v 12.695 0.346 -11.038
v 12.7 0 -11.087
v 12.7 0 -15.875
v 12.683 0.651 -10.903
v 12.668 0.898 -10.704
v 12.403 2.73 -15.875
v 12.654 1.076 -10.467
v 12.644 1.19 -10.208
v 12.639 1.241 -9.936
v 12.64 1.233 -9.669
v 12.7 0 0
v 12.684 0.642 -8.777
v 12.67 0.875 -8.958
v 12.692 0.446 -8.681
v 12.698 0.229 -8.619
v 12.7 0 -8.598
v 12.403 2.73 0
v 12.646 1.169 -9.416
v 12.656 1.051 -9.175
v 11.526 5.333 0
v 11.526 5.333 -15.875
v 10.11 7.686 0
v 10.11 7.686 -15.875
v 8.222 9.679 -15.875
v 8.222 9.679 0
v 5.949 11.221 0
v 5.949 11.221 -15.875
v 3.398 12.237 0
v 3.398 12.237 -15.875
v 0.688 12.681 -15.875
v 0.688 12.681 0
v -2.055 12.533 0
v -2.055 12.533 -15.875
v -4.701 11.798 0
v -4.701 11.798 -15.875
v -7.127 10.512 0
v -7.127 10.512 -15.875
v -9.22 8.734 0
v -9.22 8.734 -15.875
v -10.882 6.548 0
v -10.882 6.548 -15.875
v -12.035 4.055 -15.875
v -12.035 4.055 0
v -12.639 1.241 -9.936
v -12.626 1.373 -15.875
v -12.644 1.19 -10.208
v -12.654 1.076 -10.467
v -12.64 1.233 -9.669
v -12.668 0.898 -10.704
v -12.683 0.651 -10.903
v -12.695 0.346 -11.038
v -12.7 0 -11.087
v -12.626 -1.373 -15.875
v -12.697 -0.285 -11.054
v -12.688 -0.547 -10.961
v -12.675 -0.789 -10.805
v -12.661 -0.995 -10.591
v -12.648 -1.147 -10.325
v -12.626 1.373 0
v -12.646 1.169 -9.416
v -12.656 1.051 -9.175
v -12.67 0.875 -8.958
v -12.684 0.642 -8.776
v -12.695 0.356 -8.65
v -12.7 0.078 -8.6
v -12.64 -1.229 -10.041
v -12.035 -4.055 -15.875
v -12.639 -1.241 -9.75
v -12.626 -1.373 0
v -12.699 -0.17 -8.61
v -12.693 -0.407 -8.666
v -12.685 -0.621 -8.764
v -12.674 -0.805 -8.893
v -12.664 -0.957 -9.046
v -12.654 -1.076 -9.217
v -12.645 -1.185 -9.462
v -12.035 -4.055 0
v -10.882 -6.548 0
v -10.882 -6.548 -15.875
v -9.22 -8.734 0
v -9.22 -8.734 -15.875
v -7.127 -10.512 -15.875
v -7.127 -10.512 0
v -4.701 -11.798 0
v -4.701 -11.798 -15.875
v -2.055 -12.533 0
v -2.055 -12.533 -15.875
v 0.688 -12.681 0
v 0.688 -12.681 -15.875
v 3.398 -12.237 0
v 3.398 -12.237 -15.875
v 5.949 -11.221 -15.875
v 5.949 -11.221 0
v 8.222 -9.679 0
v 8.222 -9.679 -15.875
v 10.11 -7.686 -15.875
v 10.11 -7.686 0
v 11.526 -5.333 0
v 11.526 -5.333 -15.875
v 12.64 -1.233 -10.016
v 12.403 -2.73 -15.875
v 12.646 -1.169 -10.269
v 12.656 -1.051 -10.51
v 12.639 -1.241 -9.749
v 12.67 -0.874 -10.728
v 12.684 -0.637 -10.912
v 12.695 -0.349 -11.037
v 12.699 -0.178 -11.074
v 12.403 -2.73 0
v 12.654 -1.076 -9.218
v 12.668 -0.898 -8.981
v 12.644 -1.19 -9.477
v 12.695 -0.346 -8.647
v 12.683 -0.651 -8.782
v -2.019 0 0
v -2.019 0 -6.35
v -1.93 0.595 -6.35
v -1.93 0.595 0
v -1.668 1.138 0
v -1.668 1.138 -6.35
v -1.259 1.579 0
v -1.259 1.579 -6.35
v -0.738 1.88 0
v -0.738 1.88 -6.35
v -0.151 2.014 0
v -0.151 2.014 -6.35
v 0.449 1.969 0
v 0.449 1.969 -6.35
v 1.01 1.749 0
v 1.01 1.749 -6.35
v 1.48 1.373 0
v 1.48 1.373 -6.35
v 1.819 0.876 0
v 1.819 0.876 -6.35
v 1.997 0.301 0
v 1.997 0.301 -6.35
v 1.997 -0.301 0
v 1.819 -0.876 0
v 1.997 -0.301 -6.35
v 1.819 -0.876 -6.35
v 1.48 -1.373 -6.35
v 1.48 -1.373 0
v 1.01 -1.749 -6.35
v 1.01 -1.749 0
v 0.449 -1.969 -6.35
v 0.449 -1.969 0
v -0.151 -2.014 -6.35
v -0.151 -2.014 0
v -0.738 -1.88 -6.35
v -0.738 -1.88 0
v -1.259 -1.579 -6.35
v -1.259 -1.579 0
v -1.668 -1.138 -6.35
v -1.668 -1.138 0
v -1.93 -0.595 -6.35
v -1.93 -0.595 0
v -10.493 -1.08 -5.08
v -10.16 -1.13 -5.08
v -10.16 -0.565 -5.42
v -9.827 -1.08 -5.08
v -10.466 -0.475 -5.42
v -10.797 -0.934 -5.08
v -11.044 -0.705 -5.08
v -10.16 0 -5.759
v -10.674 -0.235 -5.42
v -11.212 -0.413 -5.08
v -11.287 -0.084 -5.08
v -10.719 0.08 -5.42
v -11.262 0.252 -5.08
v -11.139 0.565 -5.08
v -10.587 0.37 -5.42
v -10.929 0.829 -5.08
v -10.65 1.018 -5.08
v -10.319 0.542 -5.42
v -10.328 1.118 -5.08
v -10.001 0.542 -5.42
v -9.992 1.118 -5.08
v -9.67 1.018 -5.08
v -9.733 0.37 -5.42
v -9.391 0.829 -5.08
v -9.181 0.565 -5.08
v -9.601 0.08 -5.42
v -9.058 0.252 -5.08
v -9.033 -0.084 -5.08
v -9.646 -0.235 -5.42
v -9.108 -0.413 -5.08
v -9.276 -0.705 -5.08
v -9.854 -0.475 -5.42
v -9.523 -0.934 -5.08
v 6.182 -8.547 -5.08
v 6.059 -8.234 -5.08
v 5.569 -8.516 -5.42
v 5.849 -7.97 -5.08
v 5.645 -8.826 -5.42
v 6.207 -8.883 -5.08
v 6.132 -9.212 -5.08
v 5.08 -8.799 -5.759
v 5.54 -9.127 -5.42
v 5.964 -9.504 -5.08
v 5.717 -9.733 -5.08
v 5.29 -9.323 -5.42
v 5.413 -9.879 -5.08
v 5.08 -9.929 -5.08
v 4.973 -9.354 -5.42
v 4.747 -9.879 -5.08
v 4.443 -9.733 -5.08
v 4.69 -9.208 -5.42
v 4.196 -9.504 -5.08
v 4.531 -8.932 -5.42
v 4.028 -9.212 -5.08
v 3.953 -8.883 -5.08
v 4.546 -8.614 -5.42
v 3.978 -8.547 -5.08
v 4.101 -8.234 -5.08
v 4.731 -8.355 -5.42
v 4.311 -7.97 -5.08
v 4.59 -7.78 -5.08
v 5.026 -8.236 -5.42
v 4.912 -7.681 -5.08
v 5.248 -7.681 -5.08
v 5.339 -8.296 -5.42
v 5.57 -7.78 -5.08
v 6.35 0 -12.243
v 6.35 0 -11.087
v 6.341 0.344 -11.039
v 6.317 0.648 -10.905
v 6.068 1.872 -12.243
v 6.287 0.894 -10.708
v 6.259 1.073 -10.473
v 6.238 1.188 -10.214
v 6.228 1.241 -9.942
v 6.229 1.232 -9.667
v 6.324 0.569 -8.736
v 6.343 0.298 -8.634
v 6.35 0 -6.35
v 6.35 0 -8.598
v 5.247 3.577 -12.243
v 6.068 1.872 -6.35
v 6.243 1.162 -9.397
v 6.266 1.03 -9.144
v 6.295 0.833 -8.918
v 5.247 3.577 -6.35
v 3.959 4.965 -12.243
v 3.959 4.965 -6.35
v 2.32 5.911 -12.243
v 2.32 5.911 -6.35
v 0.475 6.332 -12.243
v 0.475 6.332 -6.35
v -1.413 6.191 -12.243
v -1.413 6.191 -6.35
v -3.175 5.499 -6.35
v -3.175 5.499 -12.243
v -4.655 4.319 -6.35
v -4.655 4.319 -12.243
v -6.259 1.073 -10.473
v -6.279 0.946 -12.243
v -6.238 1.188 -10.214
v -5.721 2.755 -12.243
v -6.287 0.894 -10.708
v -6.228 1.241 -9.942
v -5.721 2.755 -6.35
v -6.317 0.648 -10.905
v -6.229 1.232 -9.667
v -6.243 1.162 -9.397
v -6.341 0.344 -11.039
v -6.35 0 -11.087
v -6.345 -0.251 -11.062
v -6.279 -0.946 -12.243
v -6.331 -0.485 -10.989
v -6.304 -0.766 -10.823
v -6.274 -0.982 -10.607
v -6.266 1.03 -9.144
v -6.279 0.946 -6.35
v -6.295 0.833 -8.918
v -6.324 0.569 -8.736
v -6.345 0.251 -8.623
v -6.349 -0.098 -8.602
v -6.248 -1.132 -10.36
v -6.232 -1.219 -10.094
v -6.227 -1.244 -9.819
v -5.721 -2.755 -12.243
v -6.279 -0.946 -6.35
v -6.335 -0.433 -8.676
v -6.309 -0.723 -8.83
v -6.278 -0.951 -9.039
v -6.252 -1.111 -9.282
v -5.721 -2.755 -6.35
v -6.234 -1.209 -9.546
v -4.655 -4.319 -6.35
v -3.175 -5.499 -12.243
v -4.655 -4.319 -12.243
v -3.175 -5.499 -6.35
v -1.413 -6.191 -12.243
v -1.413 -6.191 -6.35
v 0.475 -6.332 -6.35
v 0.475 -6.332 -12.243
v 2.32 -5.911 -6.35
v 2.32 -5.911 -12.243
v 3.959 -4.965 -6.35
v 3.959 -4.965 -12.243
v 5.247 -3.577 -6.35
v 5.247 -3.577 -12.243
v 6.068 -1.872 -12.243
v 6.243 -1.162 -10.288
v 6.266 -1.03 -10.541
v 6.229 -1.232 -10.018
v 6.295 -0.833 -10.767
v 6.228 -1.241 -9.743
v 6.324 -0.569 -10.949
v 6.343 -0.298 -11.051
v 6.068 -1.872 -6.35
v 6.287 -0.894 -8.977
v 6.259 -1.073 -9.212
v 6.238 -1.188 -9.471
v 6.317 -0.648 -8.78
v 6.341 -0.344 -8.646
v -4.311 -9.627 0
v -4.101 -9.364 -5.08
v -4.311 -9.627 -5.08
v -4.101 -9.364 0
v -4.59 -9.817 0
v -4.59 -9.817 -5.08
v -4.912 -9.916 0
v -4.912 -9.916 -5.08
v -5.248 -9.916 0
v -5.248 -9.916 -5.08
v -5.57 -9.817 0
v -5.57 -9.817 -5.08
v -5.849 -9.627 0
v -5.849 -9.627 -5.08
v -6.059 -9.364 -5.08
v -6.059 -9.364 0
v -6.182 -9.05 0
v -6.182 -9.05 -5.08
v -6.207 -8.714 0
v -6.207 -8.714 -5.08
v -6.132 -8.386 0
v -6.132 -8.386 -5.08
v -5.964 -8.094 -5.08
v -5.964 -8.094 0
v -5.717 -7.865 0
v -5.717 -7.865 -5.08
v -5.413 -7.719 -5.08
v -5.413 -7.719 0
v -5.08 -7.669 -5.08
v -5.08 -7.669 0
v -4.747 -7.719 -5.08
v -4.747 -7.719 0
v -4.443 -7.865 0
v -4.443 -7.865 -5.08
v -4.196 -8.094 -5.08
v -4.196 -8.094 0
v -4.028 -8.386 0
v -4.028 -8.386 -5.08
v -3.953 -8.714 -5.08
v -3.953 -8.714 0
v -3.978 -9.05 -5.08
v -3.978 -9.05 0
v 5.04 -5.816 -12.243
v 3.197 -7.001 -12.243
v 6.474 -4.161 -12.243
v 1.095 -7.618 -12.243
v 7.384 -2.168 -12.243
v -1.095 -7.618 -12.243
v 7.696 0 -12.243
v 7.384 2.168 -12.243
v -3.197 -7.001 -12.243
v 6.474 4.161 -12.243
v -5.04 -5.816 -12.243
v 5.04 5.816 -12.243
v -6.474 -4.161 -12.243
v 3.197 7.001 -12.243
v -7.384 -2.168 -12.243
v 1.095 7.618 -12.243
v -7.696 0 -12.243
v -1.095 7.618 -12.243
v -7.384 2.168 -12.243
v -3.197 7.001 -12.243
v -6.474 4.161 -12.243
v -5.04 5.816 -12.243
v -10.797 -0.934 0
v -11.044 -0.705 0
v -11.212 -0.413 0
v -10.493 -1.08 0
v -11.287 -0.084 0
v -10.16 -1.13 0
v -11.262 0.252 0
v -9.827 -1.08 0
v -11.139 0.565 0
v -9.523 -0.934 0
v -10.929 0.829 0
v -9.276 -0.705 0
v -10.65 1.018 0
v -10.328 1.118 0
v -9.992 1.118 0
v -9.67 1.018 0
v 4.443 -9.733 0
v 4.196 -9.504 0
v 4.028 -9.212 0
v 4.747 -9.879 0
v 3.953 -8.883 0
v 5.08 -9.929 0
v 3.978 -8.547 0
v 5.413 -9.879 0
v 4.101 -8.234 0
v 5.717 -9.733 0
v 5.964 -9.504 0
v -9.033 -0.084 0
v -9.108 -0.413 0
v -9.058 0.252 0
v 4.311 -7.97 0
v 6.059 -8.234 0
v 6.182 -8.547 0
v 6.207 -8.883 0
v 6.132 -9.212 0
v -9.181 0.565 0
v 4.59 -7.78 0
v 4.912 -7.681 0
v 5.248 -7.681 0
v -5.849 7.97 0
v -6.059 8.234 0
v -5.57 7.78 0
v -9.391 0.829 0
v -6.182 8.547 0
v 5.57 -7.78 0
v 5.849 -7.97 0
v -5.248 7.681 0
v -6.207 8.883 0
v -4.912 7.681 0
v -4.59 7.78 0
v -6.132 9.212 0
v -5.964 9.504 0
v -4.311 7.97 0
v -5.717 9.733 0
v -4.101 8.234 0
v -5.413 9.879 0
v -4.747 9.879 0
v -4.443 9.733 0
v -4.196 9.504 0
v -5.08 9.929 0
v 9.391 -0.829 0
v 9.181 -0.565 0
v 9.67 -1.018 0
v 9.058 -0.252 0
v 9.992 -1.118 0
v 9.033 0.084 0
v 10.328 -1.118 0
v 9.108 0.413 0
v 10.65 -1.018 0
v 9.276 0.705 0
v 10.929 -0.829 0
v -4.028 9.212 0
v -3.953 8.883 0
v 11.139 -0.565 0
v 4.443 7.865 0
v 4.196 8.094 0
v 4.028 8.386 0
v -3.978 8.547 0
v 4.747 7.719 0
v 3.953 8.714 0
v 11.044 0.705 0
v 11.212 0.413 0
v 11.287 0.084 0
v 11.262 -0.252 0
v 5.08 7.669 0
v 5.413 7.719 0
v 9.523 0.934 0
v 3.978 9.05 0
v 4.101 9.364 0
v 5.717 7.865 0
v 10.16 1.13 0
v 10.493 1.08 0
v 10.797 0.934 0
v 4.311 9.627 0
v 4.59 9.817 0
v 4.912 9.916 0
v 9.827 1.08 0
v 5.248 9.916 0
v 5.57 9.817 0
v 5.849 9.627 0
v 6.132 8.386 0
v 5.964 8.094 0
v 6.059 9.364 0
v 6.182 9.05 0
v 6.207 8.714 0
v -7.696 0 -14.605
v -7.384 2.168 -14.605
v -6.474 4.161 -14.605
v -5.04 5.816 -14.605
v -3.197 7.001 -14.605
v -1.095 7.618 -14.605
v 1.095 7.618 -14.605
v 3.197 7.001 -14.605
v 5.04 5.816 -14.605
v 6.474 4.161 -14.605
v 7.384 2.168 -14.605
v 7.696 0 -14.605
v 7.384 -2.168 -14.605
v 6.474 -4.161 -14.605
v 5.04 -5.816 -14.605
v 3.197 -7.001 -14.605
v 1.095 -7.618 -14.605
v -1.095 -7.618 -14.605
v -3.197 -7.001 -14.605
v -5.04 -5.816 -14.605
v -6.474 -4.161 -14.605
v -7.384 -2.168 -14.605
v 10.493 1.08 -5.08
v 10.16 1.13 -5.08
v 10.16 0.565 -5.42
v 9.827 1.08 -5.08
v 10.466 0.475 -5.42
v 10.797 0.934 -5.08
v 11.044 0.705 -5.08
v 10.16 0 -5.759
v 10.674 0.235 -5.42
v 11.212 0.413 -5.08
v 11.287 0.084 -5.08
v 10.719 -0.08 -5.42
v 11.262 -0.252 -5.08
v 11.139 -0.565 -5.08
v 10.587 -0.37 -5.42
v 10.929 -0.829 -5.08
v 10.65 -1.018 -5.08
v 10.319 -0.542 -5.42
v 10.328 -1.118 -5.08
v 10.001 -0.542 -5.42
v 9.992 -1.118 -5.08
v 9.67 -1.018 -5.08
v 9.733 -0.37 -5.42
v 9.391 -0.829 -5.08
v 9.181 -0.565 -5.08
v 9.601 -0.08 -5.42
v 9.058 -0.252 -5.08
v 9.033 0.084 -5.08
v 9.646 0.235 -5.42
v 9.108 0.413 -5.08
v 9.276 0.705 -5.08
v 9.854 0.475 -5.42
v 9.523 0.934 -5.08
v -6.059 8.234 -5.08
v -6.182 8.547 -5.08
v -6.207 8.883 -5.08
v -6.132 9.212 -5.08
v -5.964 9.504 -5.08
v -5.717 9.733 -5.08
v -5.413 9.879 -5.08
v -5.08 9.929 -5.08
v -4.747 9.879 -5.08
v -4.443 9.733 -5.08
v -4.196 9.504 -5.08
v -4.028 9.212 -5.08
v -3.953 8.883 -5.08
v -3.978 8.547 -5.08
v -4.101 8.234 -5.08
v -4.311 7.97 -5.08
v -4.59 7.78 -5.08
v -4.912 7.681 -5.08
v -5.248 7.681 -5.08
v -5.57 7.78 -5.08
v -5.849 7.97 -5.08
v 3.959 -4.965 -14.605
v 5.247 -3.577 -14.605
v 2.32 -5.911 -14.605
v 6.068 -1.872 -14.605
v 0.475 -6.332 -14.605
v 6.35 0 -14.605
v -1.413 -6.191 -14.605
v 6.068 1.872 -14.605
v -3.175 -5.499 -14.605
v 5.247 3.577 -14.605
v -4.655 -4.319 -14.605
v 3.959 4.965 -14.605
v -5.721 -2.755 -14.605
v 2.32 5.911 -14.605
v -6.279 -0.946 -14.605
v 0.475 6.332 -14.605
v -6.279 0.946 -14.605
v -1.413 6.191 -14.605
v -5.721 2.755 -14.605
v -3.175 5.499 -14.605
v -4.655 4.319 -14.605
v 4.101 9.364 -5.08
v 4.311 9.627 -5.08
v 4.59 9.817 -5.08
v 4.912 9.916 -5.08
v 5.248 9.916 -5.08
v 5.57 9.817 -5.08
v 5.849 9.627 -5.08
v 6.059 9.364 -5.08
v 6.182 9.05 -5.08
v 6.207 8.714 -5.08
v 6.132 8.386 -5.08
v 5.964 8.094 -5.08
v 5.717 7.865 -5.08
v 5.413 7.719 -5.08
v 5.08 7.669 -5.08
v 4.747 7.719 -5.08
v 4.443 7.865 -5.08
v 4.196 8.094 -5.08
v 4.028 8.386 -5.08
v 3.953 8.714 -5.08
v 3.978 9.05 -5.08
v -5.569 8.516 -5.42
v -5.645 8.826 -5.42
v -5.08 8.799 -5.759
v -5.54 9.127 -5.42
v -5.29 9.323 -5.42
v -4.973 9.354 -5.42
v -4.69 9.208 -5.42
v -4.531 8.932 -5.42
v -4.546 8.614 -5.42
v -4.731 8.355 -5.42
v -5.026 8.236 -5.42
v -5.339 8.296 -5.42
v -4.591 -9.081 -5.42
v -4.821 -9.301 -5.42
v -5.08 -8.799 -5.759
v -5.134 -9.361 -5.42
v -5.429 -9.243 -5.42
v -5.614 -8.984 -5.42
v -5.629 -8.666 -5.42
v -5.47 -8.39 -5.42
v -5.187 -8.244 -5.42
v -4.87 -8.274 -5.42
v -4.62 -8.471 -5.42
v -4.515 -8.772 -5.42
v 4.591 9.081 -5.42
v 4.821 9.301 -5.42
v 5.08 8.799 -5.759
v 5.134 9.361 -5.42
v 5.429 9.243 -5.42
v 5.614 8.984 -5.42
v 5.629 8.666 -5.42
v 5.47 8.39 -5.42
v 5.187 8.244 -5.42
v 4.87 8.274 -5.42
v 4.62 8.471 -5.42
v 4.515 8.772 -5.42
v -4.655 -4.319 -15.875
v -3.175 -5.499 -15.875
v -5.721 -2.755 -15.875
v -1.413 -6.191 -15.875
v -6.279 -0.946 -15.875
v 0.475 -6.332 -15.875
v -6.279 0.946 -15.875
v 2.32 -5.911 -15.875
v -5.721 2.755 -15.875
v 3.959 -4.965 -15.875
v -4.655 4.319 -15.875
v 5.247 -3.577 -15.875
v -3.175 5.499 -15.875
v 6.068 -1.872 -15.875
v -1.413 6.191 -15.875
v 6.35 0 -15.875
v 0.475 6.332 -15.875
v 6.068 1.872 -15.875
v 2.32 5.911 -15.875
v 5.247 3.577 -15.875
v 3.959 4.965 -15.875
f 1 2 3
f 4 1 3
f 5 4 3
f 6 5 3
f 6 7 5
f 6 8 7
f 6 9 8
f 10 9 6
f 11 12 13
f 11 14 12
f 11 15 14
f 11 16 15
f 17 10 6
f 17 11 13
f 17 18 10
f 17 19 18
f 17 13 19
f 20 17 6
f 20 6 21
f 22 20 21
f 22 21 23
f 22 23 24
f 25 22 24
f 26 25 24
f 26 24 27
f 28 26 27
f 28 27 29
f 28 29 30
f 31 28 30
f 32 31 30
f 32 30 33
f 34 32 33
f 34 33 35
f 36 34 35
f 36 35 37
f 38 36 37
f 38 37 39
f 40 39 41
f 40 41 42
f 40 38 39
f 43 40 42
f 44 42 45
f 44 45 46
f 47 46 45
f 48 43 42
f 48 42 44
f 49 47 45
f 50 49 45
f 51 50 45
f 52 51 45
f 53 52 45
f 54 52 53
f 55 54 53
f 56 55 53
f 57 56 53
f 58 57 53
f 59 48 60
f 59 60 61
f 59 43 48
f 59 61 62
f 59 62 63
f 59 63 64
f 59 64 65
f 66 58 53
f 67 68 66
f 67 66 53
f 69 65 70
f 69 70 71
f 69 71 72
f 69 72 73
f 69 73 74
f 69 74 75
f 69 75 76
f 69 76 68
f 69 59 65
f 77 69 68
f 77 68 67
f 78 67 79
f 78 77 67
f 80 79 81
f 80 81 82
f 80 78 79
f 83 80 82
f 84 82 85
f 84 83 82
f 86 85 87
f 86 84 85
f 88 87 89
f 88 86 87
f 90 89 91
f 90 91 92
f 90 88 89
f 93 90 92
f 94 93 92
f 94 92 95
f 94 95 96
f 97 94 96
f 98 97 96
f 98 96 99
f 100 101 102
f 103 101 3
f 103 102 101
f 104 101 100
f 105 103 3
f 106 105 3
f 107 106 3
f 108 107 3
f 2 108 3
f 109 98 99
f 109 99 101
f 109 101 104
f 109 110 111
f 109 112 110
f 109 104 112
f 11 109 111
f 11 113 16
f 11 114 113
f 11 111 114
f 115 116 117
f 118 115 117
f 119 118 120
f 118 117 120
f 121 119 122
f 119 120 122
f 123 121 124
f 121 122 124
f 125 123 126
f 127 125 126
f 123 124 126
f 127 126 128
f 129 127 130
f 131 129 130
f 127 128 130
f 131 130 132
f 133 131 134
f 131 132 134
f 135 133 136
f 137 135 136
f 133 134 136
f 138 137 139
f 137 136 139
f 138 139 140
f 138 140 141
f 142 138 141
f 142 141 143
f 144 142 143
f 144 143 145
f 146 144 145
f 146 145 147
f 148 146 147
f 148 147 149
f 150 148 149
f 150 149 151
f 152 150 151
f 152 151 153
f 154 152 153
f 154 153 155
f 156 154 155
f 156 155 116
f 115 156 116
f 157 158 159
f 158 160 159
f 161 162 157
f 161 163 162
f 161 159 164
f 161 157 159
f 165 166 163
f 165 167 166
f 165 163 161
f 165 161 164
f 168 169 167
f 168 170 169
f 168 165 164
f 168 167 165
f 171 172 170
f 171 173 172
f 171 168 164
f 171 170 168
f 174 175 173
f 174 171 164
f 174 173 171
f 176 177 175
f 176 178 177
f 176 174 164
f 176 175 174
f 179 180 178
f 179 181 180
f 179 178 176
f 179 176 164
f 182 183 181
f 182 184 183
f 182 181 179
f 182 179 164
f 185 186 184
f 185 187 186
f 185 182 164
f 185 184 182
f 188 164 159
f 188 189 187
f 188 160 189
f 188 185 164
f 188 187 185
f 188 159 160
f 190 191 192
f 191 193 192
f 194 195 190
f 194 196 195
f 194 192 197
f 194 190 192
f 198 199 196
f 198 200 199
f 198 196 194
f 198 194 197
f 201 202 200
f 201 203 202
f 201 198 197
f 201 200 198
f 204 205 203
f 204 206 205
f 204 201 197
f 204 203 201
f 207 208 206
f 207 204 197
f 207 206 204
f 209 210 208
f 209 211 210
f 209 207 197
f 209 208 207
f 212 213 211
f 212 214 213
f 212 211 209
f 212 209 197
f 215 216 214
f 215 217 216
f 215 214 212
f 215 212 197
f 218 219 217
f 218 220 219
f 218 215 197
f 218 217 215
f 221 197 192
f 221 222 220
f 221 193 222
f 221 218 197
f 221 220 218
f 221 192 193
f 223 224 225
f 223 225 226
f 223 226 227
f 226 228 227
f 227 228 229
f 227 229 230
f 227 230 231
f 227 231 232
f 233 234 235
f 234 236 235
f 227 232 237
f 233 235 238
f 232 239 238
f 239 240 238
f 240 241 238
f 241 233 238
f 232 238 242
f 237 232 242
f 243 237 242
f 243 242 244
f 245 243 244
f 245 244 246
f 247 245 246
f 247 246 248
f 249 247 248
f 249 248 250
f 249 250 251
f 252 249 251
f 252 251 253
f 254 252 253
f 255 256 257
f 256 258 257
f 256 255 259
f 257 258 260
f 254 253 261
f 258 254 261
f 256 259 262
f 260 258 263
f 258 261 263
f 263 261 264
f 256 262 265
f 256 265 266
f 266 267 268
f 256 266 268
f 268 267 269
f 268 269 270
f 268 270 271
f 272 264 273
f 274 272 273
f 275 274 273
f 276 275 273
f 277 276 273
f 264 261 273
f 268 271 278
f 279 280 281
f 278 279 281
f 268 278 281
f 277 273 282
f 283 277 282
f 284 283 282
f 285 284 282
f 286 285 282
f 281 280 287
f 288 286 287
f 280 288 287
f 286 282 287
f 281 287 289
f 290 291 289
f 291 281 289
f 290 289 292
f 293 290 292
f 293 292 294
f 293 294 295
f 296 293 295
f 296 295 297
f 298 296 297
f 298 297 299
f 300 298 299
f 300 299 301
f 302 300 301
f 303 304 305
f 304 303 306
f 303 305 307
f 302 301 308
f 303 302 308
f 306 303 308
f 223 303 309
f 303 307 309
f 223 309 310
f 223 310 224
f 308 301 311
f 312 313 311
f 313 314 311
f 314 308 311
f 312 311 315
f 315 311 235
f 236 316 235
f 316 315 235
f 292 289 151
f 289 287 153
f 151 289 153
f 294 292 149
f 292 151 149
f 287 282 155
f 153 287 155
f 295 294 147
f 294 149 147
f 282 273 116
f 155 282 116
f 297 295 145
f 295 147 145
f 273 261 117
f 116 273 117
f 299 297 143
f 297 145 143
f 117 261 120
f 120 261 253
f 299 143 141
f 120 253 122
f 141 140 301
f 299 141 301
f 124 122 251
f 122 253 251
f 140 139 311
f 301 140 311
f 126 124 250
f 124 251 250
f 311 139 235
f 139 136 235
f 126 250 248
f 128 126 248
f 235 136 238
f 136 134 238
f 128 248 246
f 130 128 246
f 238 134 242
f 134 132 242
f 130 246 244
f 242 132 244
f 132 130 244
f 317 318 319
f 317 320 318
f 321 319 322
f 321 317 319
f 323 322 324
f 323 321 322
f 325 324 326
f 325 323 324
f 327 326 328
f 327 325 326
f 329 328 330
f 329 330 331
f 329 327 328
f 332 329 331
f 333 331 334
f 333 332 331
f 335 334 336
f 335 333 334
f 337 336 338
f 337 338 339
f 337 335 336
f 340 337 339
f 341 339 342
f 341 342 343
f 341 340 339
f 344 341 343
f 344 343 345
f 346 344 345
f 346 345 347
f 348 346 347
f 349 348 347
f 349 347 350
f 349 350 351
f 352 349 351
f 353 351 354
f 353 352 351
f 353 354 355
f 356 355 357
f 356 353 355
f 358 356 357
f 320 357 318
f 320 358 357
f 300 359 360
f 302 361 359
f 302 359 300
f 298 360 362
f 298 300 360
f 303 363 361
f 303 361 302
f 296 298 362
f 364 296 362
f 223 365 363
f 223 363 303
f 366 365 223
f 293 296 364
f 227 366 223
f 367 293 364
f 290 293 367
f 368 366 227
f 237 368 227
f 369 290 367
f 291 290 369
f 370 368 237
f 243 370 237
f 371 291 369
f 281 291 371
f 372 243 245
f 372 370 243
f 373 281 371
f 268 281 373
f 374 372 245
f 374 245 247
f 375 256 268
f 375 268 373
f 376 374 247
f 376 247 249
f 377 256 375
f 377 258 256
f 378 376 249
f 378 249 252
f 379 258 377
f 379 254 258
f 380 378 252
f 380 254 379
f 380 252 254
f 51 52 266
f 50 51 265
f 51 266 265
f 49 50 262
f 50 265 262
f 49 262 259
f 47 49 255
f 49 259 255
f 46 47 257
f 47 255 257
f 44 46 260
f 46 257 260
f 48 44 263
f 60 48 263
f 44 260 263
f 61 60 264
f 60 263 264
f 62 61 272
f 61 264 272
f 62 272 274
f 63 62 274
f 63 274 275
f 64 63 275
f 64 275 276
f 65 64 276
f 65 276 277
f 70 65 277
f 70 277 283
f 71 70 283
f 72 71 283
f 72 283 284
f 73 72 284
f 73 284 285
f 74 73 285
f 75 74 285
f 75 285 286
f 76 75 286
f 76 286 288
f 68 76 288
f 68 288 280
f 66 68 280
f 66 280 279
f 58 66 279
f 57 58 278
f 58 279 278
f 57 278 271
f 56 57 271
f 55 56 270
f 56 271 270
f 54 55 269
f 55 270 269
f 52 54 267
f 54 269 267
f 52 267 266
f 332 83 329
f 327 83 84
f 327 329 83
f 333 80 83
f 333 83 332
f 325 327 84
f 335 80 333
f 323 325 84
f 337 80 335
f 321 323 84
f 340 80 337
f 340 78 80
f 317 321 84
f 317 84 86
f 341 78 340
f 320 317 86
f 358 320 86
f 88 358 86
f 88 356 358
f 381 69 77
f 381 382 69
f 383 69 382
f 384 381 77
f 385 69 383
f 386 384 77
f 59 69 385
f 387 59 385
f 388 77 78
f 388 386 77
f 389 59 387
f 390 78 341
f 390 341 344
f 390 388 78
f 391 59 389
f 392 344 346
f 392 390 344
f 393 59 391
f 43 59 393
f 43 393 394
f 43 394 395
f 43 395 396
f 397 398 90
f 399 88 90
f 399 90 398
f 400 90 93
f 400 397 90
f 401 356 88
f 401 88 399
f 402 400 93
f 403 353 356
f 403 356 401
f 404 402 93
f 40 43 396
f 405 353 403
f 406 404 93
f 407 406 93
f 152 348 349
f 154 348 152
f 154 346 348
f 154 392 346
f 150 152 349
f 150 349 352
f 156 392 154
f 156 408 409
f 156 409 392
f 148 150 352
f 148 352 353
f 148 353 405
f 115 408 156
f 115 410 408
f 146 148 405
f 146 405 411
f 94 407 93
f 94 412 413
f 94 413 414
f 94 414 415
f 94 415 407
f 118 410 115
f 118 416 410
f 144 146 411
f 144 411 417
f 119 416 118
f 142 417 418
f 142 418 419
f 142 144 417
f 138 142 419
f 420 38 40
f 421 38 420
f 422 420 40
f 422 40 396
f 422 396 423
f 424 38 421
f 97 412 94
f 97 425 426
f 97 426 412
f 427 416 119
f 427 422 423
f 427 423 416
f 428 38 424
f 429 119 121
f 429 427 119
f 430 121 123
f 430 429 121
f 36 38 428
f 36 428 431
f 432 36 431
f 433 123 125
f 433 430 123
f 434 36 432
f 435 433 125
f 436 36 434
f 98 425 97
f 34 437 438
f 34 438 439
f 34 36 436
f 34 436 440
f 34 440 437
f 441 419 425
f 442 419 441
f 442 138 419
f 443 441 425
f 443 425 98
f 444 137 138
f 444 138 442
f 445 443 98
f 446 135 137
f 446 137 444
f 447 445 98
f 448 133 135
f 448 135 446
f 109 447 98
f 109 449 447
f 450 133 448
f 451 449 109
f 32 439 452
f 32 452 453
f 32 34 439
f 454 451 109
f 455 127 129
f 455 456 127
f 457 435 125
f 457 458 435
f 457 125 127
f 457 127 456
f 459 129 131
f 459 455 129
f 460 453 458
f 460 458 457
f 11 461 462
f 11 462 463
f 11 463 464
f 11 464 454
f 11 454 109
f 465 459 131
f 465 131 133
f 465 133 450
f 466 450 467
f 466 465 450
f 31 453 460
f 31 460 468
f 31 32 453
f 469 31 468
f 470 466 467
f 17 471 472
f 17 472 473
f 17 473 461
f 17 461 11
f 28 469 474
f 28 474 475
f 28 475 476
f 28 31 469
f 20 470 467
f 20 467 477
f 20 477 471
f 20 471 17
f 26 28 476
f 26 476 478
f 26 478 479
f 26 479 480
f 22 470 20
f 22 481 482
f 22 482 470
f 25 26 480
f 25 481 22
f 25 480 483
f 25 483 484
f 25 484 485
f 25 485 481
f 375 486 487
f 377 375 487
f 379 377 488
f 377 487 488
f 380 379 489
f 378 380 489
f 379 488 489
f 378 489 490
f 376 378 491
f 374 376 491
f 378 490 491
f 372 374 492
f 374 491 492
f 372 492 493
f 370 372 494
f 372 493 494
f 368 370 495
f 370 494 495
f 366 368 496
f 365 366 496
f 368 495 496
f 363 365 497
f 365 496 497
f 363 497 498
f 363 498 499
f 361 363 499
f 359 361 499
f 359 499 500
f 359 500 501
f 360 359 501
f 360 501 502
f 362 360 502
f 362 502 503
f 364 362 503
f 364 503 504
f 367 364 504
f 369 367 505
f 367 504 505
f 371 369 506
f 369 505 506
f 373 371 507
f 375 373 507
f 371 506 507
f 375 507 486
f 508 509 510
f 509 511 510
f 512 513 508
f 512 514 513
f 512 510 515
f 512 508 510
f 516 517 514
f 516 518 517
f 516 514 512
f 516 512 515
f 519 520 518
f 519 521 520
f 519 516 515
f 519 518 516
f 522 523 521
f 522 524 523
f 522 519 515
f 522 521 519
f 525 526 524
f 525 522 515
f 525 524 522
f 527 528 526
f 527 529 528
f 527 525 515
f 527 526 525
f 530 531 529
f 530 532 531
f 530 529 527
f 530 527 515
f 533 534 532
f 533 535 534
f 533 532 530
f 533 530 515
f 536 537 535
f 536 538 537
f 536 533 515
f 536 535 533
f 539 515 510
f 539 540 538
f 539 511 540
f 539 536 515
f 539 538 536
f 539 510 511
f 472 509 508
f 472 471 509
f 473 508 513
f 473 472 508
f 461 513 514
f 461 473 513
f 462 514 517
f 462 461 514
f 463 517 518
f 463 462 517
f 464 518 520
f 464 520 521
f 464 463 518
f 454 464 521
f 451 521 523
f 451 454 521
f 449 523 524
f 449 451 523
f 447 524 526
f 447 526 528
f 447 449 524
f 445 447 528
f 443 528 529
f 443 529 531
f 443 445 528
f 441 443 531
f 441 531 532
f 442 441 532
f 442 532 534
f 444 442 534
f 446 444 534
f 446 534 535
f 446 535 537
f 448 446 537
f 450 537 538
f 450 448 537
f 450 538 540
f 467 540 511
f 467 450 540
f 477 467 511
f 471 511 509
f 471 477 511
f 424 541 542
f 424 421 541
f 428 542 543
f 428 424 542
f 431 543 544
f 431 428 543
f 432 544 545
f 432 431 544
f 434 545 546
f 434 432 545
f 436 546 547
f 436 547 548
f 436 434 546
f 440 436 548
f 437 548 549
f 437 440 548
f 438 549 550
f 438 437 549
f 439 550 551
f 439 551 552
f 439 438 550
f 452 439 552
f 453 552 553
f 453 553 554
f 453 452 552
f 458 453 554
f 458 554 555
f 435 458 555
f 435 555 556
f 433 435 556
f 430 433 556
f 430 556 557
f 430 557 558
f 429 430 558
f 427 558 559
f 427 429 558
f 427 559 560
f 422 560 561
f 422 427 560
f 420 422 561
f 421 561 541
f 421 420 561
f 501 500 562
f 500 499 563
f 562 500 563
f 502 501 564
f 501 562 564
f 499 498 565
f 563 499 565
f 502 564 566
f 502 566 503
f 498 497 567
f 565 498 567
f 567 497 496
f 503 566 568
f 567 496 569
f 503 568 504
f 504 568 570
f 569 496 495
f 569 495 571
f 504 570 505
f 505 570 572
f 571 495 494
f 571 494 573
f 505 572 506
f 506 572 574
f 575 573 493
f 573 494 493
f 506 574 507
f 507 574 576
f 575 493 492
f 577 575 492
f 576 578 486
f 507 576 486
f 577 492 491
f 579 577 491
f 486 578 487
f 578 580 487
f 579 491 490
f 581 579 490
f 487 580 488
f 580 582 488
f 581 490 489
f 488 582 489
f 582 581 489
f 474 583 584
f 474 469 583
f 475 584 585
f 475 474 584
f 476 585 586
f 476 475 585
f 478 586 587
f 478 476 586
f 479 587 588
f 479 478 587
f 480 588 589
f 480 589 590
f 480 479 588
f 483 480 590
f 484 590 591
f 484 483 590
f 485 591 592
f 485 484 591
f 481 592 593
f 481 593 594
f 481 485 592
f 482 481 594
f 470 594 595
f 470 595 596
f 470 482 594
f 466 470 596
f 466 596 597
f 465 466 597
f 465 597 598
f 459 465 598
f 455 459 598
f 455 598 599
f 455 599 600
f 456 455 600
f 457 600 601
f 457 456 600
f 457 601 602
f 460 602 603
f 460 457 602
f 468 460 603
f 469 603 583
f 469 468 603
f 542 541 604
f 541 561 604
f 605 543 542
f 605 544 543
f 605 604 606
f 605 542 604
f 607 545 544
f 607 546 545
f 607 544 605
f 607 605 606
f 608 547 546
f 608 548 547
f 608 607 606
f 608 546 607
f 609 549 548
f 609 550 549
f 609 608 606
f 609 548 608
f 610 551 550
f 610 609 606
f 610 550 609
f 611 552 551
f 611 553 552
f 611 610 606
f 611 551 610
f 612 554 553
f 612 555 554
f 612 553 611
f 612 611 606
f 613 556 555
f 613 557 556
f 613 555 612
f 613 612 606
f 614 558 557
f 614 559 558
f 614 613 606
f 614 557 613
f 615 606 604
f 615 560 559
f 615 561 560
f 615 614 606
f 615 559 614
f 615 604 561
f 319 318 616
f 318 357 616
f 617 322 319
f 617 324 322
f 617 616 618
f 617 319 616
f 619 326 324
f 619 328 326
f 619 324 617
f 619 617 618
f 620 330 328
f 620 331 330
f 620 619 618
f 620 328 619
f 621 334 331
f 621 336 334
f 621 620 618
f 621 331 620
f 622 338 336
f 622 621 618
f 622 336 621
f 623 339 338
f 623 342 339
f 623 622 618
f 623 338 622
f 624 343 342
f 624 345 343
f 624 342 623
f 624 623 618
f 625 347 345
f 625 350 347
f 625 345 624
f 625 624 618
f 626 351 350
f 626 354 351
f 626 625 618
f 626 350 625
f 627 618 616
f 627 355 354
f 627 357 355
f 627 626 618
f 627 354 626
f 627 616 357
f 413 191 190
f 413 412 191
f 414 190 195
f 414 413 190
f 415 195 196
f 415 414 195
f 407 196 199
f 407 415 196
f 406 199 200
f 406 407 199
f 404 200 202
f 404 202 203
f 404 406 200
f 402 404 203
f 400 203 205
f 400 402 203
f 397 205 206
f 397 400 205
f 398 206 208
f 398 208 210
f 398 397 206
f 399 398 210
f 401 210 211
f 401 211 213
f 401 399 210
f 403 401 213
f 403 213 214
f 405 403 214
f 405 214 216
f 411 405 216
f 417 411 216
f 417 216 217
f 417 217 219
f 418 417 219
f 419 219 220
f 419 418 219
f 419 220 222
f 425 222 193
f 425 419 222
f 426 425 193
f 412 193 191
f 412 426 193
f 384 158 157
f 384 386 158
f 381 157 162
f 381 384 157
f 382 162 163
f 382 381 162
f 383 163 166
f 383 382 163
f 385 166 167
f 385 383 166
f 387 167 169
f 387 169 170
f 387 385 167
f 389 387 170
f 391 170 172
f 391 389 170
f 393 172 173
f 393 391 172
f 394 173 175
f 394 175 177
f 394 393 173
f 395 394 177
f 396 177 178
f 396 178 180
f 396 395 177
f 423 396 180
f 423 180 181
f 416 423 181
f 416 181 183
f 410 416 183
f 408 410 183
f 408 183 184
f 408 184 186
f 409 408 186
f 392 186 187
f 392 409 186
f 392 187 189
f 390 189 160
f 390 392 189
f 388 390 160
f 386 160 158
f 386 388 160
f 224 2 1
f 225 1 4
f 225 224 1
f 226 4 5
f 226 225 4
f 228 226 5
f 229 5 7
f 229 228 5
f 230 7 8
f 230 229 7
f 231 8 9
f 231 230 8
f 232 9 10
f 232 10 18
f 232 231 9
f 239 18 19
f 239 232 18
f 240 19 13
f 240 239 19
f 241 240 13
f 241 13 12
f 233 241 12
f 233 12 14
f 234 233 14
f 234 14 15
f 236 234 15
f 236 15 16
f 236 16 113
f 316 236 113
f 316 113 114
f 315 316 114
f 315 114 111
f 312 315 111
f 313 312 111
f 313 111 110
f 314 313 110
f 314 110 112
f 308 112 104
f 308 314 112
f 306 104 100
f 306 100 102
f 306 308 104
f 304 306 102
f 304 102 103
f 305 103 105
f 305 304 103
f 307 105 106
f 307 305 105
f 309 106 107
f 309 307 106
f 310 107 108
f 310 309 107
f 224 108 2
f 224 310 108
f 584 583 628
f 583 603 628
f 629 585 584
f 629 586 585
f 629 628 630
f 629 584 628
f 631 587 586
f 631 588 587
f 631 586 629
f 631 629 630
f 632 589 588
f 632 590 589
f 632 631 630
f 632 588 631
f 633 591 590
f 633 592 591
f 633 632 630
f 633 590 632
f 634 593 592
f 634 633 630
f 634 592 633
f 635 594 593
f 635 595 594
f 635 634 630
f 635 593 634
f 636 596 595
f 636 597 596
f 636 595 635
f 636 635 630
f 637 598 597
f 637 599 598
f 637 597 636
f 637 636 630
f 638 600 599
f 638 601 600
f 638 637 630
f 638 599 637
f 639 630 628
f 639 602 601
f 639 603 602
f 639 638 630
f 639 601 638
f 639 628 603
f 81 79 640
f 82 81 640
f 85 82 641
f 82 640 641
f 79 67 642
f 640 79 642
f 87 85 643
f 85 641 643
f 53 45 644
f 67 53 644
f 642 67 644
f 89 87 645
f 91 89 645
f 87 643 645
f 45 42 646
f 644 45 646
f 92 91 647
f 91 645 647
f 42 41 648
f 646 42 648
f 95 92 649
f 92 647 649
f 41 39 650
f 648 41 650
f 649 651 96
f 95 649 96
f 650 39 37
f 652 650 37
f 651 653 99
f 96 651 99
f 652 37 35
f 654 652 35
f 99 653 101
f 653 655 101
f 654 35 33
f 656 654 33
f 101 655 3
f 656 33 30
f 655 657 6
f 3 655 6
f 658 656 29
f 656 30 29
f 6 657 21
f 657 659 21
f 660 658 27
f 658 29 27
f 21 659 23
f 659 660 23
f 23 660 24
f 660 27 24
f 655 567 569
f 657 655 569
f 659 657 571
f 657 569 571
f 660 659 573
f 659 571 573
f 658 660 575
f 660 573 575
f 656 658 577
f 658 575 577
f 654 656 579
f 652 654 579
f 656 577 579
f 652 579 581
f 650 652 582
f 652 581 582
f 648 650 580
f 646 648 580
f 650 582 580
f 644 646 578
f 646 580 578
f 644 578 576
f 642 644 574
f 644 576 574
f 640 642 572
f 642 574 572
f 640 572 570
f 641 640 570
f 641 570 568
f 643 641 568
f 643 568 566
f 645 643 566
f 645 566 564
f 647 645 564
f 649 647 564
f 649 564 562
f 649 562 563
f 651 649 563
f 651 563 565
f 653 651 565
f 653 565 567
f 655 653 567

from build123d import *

# Parameters (mm, degrees)
SKETCH1_R                  = 12.7
BOSS_EXTRUDE1_DEPTH        = 15.875
SHELL1_T                   = -6.35
SKETCH4_R                  = 1.2446
CUT_EXTRUDE1_DEPTH         = 24.970724332
CUT_EXTRUDE1_DEPTH_BACK    = 24.970724332
SKETCH7_R                  = 7.6962
SKETCH7_R_2                = 6.35
CUT_EXTRUDE2_DEPTH         = 2.3622
TAP_DRILL_FOR_10_32_TAP1_D = 4.0386
CIRPATTERN1_COUNT          = 6


with BuildPart() as part:
    # Sketch1 → Boss-Extrude1 (new body)
    with BuildSketch(Plane.XY):
        Circle(SKETCH1_R)
    extrude(amount=-BOSS_EXTRUDE1_DEPTH)

    # Shell1
    shell1_openings = [part.faces().sort_by_distance(p)[0] for p in [
        (0, 0, -15.875),
    ]]
    offset(amount=SHELL1_T, openings=shell1_openings, kind=Kind.INTERSECTION)

    # Sketch4 → Cut-Extrude1 (cut, two sides)
    with BuildSketch(Plane(origin=(0, 0, 0), x_dir=(0, 0, -1), z_dir=(1, 0, 0))) as cut_extrude1_sk:
        with Locations((9.8425, 0)):
            Circle(SKETCH4_R)
    extrude(amount=CUT_EXTRUDE1_DEPTH, mode=Mode.SUBTRACT)
    extrude(cut_extrude1_sk.sketch, amount=-CUT_EXTRUDE1_DEPTH_BACK, mode=Mode.SUBTRACT)

    # Sketch7 → Cut-Extrude2 (cut)
    with BuildSketch(Plane(origin=(0, 0, -14.605), x_dir=(-1, 0, 0), z_dir=(0, 0, -1))):
        Circle(SKETCH7_R)
        with Locations(Location((0, 0, 0), (0, 0, 180))):
            Circle(SKETCH7_R_2, mode=Mode.SUBTRACT)
    extrude(amount=-CUT_EXTRUDE2_DEPTH, mode=Mode.SUBTRACT)

    # Tap Drill for #10-32 Tap1 (through all)
    with Locations(Plane.XY):
        with Locations((0, 0)):
            Hole(TAP_DRILL_FOR_10_32_TAP1_D / 2)

    # Sketch15 → Tap Drill for #4-40 Tap1 (revolve, cut)
    with BuildSketch(Plane(origin=(-10.16, 0, 0), x_dir=(0, -1, 0), z_dir=(1, 0, 0))):
        Polygon((0, 0), (0, 5.759152758), (1.1303, 5.08), (1.1303, 0), align=None)
    tap_drill_for_4_40_tap1 = revolve(axis=Axis((-10.16, 0, 6.35), (0, 0, -1)), mode=Mode.SUBTRACT)

    # CirPattern1: Tap Drill for #4-40 Tap1 ×6 about axis
    cirpattern1_axis = Axis((0, 0, 0), (0, 0, 1))
    for i in range(1, CIRPATTERN1_COUNT):
        add(tap_drill_for_4_40_tap1.rotate(cirpattern1_axis, i * 360 / CIRPATTERN1_COUNT), mode=Mode.SUBTRACT)


solid = part.part
